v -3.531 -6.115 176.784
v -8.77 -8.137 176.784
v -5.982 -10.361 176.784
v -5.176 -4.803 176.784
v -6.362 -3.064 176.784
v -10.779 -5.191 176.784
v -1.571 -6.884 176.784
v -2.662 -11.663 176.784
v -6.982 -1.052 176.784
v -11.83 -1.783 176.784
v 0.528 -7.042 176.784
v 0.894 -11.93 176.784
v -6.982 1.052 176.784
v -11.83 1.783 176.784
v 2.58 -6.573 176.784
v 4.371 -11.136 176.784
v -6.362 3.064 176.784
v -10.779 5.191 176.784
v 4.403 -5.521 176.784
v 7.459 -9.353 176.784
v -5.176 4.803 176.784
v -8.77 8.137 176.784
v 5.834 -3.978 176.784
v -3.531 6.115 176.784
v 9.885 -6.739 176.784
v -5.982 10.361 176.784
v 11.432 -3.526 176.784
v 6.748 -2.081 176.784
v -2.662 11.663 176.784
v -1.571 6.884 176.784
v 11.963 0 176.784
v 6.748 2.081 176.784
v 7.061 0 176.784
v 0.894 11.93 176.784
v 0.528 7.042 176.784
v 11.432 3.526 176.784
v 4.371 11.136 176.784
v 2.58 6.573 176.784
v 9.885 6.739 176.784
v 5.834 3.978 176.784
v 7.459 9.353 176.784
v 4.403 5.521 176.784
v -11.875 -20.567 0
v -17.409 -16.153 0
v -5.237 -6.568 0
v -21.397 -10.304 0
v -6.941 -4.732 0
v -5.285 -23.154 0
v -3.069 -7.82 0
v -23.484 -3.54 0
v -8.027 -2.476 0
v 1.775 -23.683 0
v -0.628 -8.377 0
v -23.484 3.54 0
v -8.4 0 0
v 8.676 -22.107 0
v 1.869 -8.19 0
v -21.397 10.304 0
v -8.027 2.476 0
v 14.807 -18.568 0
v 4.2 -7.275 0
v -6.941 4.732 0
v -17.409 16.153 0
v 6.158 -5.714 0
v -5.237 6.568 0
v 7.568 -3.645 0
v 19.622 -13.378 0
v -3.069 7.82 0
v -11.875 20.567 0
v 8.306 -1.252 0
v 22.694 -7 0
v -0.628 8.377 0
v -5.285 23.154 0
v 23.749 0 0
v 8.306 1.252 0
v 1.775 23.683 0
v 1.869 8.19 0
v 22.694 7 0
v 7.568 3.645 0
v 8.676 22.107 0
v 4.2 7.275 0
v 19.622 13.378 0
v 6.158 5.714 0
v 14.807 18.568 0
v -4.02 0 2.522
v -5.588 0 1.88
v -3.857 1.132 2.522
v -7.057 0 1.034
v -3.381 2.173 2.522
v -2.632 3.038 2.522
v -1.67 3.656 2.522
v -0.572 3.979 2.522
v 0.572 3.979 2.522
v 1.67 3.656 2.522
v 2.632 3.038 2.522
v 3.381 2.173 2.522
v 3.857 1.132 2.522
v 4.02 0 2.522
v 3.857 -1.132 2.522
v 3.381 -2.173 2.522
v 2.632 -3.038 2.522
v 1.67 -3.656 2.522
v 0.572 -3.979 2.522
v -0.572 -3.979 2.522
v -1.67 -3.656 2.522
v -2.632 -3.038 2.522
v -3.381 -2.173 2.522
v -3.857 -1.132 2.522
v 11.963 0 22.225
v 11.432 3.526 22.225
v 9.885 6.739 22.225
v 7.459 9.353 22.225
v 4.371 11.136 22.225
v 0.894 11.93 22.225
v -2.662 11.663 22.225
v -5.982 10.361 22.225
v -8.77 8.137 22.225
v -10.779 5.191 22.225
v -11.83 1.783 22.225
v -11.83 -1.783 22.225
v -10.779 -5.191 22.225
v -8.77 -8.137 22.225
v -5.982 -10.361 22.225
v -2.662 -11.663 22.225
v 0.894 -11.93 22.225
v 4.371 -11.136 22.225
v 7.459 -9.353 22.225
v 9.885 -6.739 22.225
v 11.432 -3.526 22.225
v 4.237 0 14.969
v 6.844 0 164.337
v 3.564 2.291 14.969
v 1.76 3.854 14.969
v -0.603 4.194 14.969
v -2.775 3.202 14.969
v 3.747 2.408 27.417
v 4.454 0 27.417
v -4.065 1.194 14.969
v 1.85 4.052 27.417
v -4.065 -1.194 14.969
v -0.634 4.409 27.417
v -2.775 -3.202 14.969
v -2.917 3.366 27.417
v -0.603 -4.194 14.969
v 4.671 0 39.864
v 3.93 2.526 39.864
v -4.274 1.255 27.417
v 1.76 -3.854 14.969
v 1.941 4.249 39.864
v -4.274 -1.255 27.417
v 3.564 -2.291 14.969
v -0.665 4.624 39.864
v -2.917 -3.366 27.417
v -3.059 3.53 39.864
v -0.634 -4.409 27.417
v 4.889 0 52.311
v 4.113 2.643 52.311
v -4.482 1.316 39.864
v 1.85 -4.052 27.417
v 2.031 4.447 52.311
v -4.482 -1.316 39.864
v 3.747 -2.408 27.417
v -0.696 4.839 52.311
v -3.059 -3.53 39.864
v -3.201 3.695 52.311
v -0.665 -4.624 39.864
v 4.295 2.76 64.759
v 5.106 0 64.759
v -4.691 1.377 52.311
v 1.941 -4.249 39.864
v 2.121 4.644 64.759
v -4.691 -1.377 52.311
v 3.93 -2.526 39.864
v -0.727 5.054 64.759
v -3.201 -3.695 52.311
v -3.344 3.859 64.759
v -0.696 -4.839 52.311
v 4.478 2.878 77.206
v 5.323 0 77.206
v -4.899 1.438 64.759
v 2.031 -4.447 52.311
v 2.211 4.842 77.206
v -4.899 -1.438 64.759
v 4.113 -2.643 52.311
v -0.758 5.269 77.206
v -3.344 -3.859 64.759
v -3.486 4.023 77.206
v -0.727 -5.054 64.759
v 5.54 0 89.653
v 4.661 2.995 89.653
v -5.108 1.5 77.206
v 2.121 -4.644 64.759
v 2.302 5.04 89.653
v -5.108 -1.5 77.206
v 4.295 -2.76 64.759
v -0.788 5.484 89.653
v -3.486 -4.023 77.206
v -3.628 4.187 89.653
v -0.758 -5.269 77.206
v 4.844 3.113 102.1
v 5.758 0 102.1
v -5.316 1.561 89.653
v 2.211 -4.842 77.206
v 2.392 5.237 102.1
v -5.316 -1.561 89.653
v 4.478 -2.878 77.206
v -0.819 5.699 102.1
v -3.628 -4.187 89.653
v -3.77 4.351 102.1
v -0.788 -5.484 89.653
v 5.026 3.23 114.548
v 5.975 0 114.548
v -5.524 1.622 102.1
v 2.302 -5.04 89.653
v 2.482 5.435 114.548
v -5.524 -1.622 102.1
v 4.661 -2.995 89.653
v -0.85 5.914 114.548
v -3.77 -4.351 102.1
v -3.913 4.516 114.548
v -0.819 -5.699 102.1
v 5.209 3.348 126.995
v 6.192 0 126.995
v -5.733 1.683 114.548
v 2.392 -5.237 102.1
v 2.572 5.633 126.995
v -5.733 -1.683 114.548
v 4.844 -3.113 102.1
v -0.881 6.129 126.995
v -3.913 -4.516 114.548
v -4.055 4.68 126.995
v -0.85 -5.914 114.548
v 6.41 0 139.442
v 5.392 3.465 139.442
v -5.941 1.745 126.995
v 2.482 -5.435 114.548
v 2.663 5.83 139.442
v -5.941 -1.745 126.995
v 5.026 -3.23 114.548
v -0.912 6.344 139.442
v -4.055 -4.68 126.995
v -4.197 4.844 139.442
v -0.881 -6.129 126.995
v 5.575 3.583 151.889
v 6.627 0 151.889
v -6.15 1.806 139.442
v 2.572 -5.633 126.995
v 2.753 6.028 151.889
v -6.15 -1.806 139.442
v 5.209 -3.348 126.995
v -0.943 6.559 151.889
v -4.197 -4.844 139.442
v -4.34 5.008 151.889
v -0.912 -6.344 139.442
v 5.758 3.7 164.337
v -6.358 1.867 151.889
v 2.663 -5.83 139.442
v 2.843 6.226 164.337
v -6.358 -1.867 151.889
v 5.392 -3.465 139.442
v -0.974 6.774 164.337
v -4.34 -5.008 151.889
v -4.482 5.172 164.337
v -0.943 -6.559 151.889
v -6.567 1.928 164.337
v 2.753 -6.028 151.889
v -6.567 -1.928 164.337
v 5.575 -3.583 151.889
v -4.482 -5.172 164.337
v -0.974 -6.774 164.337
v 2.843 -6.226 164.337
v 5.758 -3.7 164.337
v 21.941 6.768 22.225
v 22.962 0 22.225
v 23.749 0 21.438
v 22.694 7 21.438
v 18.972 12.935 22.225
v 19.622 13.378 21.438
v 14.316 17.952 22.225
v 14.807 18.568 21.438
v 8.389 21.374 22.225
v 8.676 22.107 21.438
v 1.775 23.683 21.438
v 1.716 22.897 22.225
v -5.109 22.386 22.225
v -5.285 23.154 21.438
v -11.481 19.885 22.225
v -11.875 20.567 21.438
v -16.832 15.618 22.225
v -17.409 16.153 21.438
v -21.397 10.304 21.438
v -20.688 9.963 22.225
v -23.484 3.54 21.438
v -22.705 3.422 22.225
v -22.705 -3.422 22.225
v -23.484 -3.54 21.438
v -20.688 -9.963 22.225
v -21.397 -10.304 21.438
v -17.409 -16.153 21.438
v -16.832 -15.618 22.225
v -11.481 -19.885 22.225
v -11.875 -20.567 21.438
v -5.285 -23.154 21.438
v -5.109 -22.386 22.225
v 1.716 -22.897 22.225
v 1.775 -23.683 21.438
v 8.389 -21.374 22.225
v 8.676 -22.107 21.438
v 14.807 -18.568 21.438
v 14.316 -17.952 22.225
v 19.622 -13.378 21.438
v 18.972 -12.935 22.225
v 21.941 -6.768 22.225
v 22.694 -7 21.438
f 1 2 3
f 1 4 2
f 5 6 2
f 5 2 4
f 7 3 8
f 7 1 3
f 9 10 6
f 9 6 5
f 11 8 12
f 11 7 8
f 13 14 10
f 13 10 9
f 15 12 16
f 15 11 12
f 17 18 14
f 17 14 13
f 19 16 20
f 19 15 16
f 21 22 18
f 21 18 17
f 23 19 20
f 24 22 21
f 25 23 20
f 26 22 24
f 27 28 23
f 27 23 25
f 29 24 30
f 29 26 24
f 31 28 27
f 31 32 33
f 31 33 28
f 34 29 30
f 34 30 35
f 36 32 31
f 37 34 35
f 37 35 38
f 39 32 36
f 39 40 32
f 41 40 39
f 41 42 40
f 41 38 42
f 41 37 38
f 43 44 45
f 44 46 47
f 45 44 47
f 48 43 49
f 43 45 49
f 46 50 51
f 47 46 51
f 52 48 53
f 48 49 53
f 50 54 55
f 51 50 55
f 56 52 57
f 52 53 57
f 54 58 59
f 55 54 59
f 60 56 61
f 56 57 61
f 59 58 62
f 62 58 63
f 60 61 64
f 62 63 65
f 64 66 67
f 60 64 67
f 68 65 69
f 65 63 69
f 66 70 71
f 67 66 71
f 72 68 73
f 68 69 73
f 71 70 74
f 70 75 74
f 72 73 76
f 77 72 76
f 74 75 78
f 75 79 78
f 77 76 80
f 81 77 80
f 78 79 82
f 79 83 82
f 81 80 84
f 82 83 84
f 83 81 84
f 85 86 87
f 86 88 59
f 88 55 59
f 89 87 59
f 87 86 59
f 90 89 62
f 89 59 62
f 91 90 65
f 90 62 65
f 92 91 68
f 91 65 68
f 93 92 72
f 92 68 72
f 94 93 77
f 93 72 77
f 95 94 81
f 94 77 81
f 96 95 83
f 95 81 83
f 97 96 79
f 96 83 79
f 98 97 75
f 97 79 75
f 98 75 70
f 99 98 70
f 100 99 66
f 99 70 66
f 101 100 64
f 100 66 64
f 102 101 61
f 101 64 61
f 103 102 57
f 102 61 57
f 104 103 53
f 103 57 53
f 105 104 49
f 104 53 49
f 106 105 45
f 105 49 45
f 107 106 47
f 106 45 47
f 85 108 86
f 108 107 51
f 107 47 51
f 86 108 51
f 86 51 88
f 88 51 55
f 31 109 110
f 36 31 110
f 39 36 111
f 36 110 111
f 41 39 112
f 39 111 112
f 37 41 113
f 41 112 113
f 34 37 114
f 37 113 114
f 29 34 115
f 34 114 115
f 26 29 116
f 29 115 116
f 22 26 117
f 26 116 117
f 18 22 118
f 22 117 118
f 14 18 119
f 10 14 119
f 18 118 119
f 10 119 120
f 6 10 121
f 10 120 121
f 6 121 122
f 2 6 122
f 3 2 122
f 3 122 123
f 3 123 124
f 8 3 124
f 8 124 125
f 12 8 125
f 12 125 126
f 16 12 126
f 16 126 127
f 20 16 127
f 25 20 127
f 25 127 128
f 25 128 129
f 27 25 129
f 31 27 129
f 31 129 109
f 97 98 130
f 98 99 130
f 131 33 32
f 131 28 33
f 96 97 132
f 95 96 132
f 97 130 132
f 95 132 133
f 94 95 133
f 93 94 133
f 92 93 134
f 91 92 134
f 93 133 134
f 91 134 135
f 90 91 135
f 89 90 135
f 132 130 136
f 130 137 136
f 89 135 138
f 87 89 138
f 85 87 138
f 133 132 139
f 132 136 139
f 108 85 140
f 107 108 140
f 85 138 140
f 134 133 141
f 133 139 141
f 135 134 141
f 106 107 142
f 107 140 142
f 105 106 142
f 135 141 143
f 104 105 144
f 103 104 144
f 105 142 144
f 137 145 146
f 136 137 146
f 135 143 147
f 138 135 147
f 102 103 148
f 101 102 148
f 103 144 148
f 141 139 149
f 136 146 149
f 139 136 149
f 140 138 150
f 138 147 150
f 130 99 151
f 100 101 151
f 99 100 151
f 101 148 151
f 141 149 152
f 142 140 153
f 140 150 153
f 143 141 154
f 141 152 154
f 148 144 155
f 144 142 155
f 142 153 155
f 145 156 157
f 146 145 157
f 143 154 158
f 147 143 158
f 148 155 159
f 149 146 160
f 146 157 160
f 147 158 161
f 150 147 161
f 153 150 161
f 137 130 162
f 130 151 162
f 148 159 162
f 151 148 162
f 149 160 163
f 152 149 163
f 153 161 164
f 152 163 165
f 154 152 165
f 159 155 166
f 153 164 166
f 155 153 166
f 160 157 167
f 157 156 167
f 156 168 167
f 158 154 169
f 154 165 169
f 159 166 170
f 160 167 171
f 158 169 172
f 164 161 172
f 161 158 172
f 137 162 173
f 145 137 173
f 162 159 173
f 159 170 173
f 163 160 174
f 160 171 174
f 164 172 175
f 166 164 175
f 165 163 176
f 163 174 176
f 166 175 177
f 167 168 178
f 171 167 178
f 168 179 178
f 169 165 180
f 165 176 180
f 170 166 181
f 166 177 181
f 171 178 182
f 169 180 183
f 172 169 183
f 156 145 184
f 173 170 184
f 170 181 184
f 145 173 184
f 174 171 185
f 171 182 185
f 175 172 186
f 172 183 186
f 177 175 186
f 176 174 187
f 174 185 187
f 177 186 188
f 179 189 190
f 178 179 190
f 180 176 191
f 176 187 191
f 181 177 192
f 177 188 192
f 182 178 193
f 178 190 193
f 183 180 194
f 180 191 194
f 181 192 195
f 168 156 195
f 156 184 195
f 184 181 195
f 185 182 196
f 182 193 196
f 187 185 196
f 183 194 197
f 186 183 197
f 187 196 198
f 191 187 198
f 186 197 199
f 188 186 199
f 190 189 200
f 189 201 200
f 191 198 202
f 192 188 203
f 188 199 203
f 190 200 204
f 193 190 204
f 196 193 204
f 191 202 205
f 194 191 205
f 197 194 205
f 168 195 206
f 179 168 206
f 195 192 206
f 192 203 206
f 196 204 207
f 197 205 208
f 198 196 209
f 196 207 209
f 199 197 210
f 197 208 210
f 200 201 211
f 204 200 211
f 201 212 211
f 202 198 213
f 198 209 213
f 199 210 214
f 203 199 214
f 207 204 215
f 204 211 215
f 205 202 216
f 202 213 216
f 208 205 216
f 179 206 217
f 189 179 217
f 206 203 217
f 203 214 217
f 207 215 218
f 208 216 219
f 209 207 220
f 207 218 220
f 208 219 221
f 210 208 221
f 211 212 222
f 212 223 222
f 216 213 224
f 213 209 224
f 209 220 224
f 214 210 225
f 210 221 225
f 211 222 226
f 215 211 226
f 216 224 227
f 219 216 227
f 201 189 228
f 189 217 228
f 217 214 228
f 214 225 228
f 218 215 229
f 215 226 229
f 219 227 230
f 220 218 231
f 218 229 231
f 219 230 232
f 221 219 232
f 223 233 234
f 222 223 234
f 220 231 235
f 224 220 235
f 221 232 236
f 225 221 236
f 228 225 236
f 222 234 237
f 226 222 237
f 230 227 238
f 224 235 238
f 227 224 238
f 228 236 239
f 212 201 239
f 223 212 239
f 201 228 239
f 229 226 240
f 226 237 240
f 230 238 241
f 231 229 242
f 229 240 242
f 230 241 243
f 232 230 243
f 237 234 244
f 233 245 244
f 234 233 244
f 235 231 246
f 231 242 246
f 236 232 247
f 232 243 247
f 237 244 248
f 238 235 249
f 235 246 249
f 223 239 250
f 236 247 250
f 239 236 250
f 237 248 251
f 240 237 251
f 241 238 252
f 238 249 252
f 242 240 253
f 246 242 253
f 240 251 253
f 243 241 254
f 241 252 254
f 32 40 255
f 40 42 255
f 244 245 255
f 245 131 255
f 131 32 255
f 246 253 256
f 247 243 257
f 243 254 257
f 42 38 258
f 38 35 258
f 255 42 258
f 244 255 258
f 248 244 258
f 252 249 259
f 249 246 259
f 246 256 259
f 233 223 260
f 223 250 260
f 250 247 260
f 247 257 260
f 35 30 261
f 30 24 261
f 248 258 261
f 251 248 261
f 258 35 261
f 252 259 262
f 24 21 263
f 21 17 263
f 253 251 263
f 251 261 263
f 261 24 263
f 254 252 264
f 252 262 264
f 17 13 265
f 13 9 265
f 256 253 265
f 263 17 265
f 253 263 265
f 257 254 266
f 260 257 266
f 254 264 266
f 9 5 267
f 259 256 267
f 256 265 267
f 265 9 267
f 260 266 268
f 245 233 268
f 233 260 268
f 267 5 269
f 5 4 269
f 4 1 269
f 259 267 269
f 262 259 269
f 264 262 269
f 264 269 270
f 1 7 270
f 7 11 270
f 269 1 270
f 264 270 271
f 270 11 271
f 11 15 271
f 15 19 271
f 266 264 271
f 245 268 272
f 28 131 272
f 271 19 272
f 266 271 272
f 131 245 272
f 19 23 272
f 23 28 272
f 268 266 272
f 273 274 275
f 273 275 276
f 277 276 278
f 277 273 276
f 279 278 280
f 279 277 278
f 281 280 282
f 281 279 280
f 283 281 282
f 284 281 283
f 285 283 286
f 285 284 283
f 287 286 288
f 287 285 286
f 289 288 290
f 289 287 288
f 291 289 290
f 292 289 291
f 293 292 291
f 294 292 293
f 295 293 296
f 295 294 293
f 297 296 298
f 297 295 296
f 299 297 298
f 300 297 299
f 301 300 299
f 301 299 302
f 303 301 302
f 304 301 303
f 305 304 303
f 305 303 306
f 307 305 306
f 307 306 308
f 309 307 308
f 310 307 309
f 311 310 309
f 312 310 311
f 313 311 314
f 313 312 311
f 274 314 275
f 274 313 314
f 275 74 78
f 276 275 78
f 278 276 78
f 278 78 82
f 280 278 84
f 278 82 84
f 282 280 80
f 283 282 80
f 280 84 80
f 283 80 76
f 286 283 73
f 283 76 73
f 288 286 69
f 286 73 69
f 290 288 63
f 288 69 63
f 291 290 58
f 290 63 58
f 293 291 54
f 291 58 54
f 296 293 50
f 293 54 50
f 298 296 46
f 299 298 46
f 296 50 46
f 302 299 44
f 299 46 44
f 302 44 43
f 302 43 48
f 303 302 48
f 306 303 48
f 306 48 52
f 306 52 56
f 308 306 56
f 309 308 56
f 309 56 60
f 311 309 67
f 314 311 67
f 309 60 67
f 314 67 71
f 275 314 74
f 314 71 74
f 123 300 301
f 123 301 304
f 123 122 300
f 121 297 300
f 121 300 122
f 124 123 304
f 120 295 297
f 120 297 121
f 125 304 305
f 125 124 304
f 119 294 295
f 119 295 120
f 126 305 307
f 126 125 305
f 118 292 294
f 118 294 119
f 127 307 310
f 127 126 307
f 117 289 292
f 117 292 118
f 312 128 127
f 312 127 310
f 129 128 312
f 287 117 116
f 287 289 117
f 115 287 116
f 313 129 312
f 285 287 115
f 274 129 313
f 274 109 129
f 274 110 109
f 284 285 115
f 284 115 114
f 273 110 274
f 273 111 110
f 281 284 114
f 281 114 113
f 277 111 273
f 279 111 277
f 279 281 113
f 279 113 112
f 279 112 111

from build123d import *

# Parameters (mm, degrees)
F0_R     = 23.749
F1_DEPTH = 22.225
F2_R     = 11.9634
F3_DEPTH = 176.784
F4_R     = 3.9755383952
F5_DEPTH = 176.785
F5_TAPER = -1
F8_SIZE  = 0.7874


with BuildPart() as f1:
    # F0 (on Top) → F1 (new body)
    with BuildSketch(Plane.XY):
        Circle(F0_R)
    extrude(amount=F1_DEPTH)

    # F2 (on Top) → F3 (join)
    with BuildSketch(Plane.XY):
        Circle(F2_R)
    extrude(amount=F3_DEPTH)

    # F4 (on Top) → F5 (cut, through all)
    with BuildSketch(Plane.XY):
        Circle(F4_R)
    extrude(amount=F5_DEPTH, taper=F5_TAPER, mode=Mode.SUBTRACT)

    # F6 (on Front) → F7 (revolve, cut)
    with BuildSketch(Plane.XZ):
        with BuildLine():
            Line((0, -9.525), (0, 0))
            Line((0, 0), (0, 3.175))
            ThreePointArc((0, 3.175), (-12.7, -9.525), (0, -22.225))
            Line((0, -22.225), (0, -9.525))
        make_face()
    revolve(axis=Axis((0, 0, -4.7625), (0, 0, -1)), mode=Mode.SUBTRACT)

    # F8
    f8_edges = [f1.edges().sort_by_distance(p)[0] for p in [
        (-23.749, 0, 22.225),
    ]]
    chamfer(f8_edges, length=F8_SIZE)


solid = f1.part
